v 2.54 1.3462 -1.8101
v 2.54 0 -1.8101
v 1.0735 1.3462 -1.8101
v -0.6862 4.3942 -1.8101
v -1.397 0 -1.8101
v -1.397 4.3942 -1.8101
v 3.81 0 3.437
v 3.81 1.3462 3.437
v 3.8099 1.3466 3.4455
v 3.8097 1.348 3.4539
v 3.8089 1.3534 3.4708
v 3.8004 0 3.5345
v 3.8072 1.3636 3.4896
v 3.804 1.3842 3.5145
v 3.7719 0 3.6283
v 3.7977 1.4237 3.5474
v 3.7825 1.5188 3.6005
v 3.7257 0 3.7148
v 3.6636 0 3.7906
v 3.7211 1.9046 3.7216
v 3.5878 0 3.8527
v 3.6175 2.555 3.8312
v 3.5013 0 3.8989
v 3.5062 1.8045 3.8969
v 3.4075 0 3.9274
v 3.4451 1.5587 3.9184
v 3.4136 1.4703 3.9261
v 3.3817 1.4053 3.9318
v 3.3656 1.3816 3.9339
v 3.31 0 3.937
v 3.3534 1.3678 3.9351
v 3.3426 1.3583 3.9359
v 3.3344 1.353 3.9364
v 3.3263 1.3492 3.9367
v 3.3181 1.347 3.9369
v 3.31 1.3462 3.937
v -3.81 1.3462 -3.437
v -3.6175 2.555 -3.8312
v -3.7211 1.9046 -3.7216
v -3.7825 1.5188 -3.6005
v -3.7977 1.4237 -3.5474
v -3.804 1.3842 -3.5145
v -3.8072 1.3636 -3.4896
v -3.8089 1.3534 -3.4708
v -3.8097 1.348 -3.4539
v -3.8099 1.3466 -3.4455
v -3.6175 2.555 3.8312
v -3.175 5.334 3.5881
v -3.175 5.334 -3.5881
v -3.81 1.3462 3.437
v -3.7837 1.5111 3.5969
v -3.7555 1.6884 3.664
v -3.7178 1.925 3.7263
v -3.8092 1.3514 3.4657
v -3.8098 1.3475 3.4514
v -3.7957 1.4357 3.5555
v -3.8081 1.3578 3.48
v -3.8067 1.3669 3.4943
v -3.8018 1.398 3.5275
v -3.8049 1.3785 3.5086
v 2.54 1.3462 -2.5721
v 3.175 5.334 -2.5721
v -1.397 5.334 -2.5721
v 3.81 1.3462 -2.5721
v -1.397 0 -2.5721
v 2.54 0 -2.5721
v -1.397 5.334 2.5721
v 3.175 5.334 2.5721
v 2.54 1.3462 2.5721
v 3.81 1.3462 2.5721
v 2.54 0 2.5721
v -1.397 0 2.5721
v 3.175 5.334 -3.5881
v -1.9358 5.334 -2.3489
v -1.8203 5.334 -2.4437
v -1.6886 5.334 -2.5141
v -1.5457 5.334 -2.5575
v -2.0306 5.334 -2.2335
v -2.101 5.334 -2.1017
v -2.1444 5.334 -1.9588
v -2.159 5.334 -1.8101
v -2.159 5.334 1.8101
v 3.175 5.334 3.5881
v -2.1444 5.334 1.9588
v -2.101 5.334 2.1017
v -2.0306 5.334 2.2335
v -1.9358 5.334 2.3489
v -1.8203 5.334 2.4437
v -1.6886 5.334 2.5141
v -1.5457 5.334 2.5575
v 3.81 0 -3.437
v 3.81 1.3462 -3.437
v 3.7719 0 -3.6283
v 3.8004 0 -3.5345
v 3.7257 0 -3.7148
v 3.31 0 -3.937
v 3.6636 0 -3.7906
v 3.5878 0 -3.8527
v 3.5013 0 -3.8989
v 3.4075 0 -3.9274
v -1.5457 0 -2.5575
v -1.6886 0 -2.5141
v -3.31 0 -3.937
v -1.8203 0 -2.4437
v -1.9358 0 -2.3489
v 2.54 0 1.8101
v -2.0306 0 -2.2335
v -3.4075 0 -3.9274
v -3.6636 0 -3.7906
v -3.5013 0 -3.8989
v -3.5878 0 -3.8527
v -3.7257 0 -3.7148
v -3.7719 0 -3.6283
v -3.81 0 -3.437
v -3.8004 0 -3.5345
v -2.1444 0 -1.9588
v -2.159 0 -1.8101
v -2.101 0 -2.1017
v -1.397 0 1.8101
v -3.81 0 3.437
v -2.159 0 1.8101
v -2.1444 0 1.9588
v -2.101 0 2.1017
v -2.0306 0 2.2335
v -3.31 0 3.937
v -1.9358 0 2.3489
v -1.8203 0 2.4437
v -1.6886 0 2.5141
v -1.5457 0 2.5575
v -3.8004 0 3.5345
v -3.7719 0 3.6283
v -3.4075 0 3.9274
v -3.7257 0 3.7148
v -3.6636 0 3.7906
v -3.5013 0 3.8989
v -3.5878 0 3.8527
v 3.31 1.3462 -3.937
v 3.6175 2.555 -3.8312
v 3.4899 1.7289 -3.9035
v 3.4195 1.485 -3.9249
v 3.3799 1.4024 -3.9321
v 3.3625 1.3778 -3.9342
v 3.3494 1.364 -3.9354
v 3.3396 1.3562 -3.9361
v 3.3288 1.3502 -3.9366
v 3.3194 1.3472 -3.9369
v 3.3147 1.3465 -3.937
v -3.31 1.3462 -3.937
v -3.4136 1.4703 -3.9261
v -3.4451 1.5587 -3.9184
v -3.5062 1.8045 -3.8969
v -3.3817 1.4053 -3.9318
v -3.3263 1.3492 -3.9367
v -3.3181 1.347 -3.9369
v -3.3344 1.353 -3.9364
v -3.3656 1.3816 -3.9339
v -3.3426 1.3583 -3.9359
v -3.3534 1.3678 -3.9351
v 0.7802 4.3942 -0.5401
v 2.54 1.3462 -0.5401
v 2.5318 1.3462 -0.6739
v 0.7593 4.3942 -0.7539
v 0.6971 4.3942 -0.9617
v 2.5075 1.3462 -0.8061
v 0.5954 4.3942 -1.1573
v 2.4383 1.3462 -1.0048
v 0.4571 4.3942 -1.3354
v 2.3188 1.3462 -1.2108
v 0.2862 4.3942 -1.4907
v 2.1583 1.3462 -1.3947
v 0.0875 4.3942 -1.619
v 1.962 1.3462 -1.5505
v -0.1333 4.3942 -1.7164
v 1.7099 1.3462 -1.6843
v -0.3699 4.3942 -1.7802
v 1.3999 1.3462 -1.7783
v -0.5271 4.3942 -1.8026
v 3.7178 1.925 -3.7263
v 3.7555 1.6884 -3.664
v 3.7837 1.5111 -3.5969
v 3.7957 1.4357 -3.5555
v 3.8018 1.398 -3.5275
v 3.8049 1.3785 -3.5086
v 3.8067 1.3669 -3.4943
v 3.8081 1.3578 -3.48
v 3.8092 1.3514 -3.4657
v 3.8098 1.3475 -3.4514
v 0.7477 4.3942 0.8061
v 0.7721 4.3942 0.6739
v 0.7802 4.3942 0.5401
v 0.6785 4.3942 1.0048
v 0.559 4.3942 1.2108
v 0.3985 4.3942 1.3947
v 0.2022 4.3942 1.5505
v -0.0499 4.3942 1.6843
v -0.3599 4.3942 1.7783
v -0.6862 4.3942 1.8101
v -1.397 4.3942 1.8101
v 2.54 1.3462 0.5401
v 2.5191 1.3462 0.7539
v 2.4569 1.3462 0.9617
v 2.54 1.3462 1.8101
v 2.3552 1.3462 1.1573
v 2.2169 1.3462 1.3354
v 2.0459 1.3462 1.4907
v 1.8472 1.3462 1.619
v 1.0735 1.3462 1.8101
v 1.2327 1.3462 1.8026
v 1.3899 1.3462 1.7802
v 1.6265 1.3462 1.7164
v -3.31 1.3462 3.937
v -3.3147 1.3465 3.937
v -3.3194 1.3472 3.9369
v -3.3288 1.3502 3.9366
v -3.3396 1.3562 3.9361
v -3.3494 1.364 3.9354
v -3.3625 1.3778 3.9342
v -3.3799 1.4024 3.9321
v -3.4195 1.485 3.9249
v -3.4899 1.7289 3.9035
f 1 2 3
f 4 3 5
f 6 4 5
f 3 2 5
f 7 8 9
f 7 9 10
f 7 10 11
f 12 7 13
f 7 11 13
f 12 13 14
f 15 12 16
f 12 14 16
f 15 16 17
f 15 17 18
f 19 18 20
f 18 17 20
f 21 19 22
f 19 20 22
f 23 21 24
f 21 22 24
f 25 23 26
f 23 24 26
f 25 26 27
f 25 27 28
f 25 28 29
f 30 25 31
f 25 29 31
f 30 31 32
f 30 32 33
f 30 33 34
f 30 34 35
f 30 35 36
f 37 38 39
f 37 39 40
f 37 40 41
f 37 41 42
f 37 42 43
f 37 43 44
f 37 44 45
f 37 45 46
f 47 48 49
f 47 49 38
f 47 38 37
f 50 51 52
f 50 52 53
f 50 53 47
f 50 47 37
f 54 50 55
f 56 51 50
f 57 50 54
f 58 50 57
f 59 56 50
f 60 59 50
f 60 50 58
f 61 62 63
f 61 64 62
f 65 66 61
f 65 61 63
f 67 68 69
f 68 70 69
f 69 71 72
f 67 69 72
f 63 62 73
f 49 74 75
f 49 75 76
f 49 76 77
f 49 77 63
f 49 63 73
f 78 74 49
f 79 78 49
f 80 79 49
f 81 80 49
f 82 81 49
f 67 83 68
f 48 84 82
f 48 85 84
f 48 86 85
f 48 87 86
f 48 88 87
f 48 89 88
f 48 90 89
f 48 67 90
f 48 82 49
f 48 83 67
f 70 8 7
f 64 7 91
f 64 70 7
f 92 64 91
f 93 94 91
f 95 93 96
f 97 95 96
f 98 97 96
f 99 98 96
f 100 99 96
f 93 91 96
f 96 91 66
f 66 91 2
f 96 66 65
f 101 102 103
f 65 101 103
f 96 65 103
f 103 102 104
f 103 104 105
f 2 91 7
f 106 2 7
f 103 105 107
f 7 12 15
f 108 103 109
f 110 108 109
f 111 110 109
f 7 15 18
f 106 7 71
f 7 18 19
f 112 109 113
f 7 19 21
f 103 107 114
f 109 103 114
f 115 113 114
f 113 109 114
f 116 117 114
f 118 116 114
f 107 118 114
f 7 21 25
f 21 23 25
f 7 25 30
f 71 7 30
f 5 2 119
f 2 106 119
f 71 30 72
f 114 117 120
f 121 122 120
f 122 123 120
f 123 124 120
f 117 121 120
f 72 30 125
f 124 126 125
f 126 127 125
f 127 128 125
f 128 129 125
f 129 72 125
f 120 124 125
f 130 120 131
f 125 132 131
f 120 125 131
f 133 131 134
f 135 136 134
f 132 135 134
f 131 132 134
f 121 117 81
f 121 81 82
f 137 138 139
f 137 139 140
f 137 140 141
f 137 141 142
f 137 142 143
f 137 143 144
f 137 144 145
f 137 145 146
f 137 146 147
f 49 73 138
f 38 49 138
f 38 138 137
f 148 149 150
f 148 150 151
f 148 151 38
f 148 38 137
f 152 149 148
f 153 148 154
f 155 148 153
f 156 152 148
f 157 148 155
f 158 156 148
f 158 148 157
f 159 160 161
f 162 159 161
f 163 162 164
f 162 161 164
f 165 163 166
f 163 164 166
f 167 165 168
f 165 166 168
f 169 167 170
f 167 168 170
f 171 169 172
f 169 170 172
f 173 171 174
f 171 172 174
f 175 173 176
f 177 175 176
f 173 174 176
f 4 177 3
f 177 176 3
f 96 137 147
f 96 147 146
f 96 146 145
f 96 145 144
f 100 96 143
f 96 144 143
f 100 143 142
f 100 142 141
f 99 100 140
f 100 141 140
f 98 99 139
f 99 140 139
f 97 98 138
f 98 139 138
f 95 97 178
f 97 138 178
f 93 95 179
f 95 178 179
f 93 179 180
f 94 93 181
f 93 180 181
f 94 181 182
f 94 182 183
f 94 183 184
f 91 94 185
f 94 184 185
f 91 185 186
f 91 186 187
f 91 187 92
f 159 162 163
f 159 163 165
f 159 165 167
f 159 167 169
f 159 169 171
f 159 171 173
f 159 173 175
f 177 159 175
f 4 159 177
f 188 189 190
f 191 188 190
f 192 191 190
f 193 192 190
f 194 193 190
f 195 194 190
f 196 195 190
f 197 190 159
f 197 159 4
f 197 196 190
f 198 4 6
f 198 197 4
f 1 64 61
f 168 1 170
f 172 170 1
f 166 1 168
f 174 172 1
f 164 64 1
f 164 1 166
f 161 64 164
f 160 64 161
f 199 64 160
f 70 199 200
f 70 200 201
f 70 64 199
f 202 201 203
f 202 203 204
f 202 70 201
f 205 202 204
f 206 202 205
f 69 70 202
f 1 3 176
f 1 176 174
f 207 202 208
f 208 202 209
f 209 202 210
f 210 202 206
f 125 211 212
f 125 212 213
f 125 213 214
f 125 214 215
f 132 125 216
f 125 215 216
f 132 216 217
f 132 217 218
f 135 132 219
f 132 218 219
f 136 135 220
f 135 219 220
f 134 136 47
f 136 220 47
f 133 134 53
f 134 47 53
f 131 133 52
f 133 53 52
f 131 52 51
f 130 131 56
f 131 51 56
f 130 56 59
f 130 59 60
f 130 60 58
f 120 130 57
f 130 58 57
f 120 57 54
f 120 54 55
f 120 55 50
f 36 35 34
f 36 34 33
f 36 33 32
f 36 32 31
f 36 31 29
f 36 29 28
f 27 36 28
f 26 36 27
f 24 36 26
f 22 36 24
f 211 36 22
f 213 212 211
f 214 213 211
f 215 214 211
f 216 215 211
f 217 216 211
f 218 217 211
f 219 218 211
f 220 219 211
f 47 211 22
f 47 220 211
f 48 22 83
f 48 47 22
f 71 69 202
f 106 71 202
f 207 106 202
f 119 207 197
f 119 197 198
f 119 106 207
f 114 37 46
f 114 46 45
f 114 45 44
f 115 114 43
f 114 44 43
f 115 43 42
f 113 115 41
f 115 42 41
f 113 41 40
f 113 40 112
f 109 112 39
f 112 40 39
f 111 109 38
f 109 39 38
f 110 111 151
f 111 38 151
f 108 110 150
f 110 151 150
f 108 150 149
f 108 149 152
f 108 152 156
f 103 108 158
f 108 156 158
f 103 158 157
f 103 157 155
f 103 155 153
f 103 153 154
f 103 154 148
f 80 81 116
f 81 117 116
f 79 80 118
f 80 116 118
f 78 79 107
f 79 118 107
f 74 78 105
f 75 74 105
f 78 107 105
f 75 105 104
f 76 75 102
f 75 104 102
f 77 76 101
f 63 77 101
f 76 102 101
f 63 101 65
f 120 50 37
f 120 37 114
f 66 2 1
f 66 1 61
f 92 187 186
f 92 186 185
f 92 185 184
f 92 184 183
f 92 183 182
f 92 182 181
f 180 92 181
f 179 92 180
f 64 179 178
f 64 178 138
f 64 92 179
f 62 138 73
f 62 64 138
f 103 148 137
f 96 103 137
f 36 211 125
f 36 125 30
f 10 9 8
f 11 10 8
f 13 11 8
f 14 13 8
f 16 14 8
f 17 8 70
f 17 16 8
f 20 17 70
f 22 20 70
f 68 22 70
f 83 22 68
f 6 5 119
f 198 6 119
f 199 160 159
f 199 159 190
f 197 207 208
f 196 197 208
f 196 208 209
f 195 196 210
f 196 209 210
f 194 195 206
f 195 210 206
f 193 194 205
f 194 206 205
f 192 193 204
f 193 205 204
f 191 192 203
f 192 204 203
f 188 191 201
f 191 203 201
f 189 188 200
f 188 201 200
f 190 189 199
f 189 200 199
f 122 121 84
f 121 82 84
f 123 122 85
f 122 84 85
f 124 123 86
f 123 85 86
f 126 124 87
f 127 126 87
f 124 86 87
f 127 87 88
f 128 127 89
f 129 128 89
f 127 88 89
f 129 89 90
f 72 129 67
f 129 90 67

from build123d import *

# Parameters (mm, degrees)
EXTRUDE1_DEPTH      = 3.937
DRAFT1_START        = -3.81
DRAFT1_DEPTH        = 7.62
SKETCH3_W           = 5.969
SKETCH3_H           = 5.144225416
CUT_EXTRUDE1_DEPTH  = 16.999459798
CUT_EXTRUDE2_DEPTH  = 16.999459798
SKETCH5_W           = 3.937
SKETCH5_H           = 3.620225416
EXTRUDE2_DEPTH      = 3.048
DRAFT2_ANGLE        = 30
FILLET1_R           = 1.27
FILLET2_R           = 0.762
SKETCH6_W           = 3.937
SKETCH6_H           = 3.620225416
EXTRUDE3_DEPTH      = 1.3462
CUT_EXTRUDE3_DEPTH  = 16.999459798
SKETCH12_W          = 4.3942
SKETCH12_H          = 1.3462
BOSS_EXTRUDE1_DEPTH = 70
CUT_EXTRUDE8_DEPTH  = 1.524
LPATTERN1_START     = -1.524
LPATTERN1_DEPTH     = 3.048
CUT_EXTRUDE9_DEPTH  = 86.170550743
FILLET3_R           = 1
CUT_EXTRUDE10_DEPTH = 85.172743295
FILLET4_R           = 0.5
CUT_EXTRUDE11_START = -1.3462
CUT_EXTRUDE11_DEPTH = 1.3462


# Read off the part's stored shape, not the designer's step: Draft1, LPattern1, Cut-Extrude11
with BuildPart() as part:
    # Sketch1 → Extrude1 (new, symmetric)
    with BuildSketch(Plane.XY):
        Polygon((3.81, 1.3462), (3.175, 5.334), (-3.175, 5.334), (-3.81, 1.3462), (-3.81, 0), (14.986, 0), (14.986, 1.3462), align=None)
    extrude(amount=EXTRUDE1_DEPTH, both=True)

    # Draft1 outline → Draft1 (cut)
    with BuildSketch(Plane.YZ.offset(DRAFT1_START)):
        Polygon((1.3462, 3.937), (5.334, 3.588112708), (5.334, 3.937), align=None)
        Polygon((5.334, -3.588112708), (1.3462, -3.937), (5.334, -3.937), align=None)
    extrude(amount=DRAFT1_DEPTH, mode=Mode.SUBTRACT)

    # Sketch3 → Cut-Extrude1 (cut, through all)
    with BuildSketch(Plane(origin=(0, 1.3462, 0), x_dir=(-1, 0, 0), z_dir=(0, 1, 0))):
        with Locations((-0.8255, 0)):
            Rectangle(SKETCH3_W, SKETCH3_H)
    extrude(amount=CUT_EXTRUDE1_DEPTH, mode=Mode.SUBTRACT)

    # Sketch4 → Cut-Extrude2 (cut, through all)
    with BuildSketch(Plane(origin=(0, 1.3462, 0), x_dir=(-1, 0, 0), z_dir=(0, 1, 0))):
        Polygon((2.159, 2.572112708), (-2.54, 2.572112708), (-2.54, 1.810112708), (1.397, 1.810112708), (1.397, -1.810112708), (-2.54, -1.810112708), (-2.54, -2.572112708), (2.159, -2.572112708), align=None)
    extrude(amount=-CUT_EXTRUDE2_DEPTH, mode=Mode.SUBTRACT)

    # Sketch5 → Extrude2 (add)
    with BuildSketch(Plane(origin=(0, 1.3462, 0), x_dir=(-1, 0, 0), z_dir=(0, 1, 0))):
        with Locations((-0.5715, 0)):
            Rectangle(SKETCH5_W, SKETCH5_H)
    extrude(amount=EXTRUDE2_DEPTH)

    # Draft2
    draft2_faces = [part.faces().sort_by_distance(p)[0] for p in [
        (2.54, 2.8702, 0),
    ]]
    draft(draft2_faces, Plane(origin=(14.986, 1.3462, 3.937), x_dir=(1, 0, 0), z_dir=(0, 1, 0)), DRAFT2_ANGLE)

    # Fillet1
    # the kernel refuses this fillet: 1.27 mm, written as the material it takes off along each edge
    with BuildSketch(Plane(origin=(4.1275, -1.403430657, 1.810112708), x_dir=(-0.866025403784438, -0.500000000000001, 0), z_dir=(-0.500000000000001, 0.866025403784438, 0))) as fillet1_piece_1_section:
        with BuildLine():
            CenterArc((FILLET1_R, -FILLET1_R), FILLET1_R, 90, 90)
            Line((0, -FILLET1_R), (0, 0))
            Line((0, 0), (FILLET1_R, 0))
        make_face()
    fillet1_piece_1 = extrude(amount=9.869527241, mode=Mode.PRIVATE)
    fillet1_piece_1 = split(fillet1_piece_1, bisect_by=Plane(origin=(2.54, 0.912532514, 1.637821639), z_dir=(-1, 0, 0)), keep=Keep.TOP, mode=Mode.PRIVATE)
    add(fillet1_piece_1, mode=Mode.SUBTRACT)
    with BuildSketch(Plane(origin=(4.1275, -1.403430657, -1.810112708), x_dir=(-0.8660254037844382, -0.500000000000001, 0), z_dir=(-0.500000000000001, 0.866025403784438, 0))) as fillet1_piece_2_section:
        with BuildLine():
            CenterArc((FILLET1_R, FILLET1_R), FILLET1_R, 180, 90)
            Line((0, FILLET1_R), (0, 0))
            Line((0, 0), (FILLET1_R, 0))
        make_face()
    fillet1_piece_2 = extrude(amount=9.869527241, mode=Mode.PRIVATE)
    fillet1_piece_2 = split(fillet1_piece_2, bisect_by=Plane(origin=(2.54, 0.912532514, -1.637821639), z_dir=(-1, 0, 0)), keep=Keep.TOP, mode=Mode.PRIVATE)
    add(fillet1_piece_2, mode=Mode.SUBTRACT)

    # Fillet2
    fillet2_edges = [part.edges().sort_by_distance(p)[0] for p in [
        (-2.159, 2.667, 2.572112708),
        (-2.159, 2.667, -2.572112708),
    ]]
    fillet(fillet2_edges, radius=FILLET2_R)

    # Sketch6 → Extrude3 (add)
    with BuildSketch(Plane.XZ):
        with Locations((0.5715, 0)):
            Rectangle(SKETCH6_W, SKETCH6_H)
    extrude(amount=-EXTRUDE3_DEPTH)

    # Sketch7 → Cut-Extrude3 (cut, through all)
    with BuildSketch(Plane(origin=(0, 1.3462, 0), x_dir=(-1, 0, 0), z_dir=(0, 1, 0))):
        Polygon((-14.986, 3.937), (-3.81, 3.937), (-10.668, 2.1971), (-14.986, 2.1971), align=None)
        Polygon((-14.986, -3.937), (-3.81, -3.937), (-10.668, -2.1971), (-14.986, -2.1971), align=None)
    extrude(amount=-CUT_EXTRUDE3_DEPTH, mode=Mode.SUBTRACT)

    # Sketch12 → Boss-Extrude1 (add)
    with BuildSketch(Plane(origin=(14.986, 0, 0), x_dir=(0, 0, -1), z_dir=(1, 0, 0))):
        with Locations((0, 0.6731)):
            Rectangle(SKETCH12_W, SKETCH12_H)
    extrude(amount=BOSS_EXTRUDE1_DEPTH)

    # Sketch11 → Cut-Extrude8 (cut, symmetric)
    with BuildSketch(Plane.XY):
        Polygon((10.668, 1.3462), (10.668, 1.0922), (11.684, 1.3462), (11.684, 1.637608524), (10.668, 1.637608524), align=None)
    extrude(amount=CUT_EXTRUDE8_DEPTH, both=True, mode=Mode.SUBTRACT)

    # LPattern1 outline → LPattern1 (cut)
    with BuildSketch(Plane.XY.offset(LPATTERN1_START)):
        Polygon((14.184, 1.3462), (13.168, 1.3462), (13.168, 1.0922), align=None)
        Polygon((79.184, 1.3462), (78.168, 1.3462), (78.168, 1.0922), align=None)
        Polygon((76.684, 1.3462), (75.668, 1.3462), (75.668, 1.0922), align=None)
        Polygon((74.184, 1.3462), (73.168, 1.3462), (73.168, 1.0922), align=None)
        Polygon((71.684, 1.3462), (70.668, 1.3462), (70.668, 1.0922), align=None)
        Polygon((69.184, 1.3462), (68.168, 1.3462), (68.168, 1.0922), align=None)
        Polygon((66.684, 1.3462), (65.668, 1.3462), (65.668, 1.0922), align=None)
        Polygon((64.184, 1.3462), (63.168, 1.3462), (63.168, 1.0922), align=None)
        Polygon((61.684, 1.3462), (60.668, 1.3462), (60.668, 1.0922), align=None)
        Polygon((59.184, 1.3462), (58.168, 1.3462), (58.168, 1.0922), align=None)
        Polygon((56.684, 1.3462), (55.668, 1.3462), (55.668, 1.0922), align=None)
        Polygon((54.184, 1.3462), (53.168, 1.3462), (53.168, 1.0922), align=None)
        Polygon((51.684, 1.3462), (50.668, 1.3462), (50.668, 1.0922), align=None)
        Polygon((49.184, 1.3462), (48.168, 1.3462), (48.168, 1.0922), align=None)
        Polygon((46.684, 1.3462), (45.668, 1.3462), (45.668, 1.0922), align=None)
        Polygon((44.184, 1.3462), (43.168, 1.3462), (43.168, 1.0922), align=None)
        Polygon((41.684, 1.3462), (40.668, 1.3462), (40.668, 1.0922), align=None)
        Polygon((39.184, 1.3462), (38.168, 1.3462), (38.168, 1.0922), align=None)
        Polygon((36.684, 1.3462), (35.668, 1.3462), (35.668, 1.0922), align=None)
        Polygon((34.184, 1.3462), (33.168, 1.3462), (33.168, 1.0922), align=None)
        Polygon((31.684, 1.3462), (30.668, 1.3462), (30.668, 1.0922), align=None)
        Polygon((29.184, 1.3462), (28.168, 1.3462), (28.168, 1.0922), align=None)
        Polygon((26.684, 1.3462), (25.668, 1.3462), (25.668, 1.0922), align=None)
        Polygon((24.184, 1.3462), (23.168, 1.3462), (23.168, 1.0922), align=None)
        Polygon((21.684, 1.3462), (20.668, 1.3462), (20.668, 1.0922), align=None)
        Polygon((19.184, 1.3462), (18.168, 1.3462), (18.168, 1.0922), align=None)
        Polygon((16.684, 1.3462), (15.668, 1.3462), (15.668, 1.0922), align=None)
    extrude(amount=LPATTERN1_DEPTH, mode=Mode.SUBTRACT)

    # Sketch13 → Cut-Extrude9 (cut, through all)
    with BuildSketch(Plane(origin=(0, 1.3462, 0), x_dir=(1, 0, 0), z_dir=(0, 1, 0))):
        Polygon((84.986, -2.1971), (84.986, 0), (81.180511171, -2.1971), align=None)
        Polygon((81.180511171, 2.1971), (84.986, 0), (84.986, 2.1971), align=None)
    extrude(amount=-CUT_EXTRUDE9_DEPTH, mode=Mode.SUBTRACT)

    # Fillet3
    fillet3_edges = [part.edges().sort_by_distance(p)[0] for p in [
        (84.986, 0.6731, 0),
    ]]
    fillet(fillet3_edges, radius=FILLET3_R)

    # Sketch14 → Cut-Extrude10 (cut, through all)
    with BuildSketch(Plane(origin=(0, 1.3462, 0), x_dir=(1, 0, 0), z_dir=(0, 1, 0))):
        Polygon((10.668, 2.1971), (3.81, 2.1971), (3.81, 3.937), align=None)
    cut_extrude10 = extrude(amount=-CUT_EXTRUDE10_DEPTH, mode=Mode.SUBTRACT)

    # Mirror1: Cut-Extrude10 across plane
    add(cut_extrude10.mirror(Plane.XY), mode=Mode.SUBTRACT)

    # Fillet4
    # the kernel refuses this fillet: 0.5 mm, written as the material it adds along each edge
    with BuildSketch(Plane(origin=(3.81, 1.3462, -2.1971), x_dir=(1, 0, 0), z_dir=(0, -1, 0)), Plane(origin=(3.81, 1.3462, 2.1971), x_dir=(0, 0, 1), z_dir=(0, -1, 0))) as fillet4_piece_1:
        with BuildLine():
            CenterArc((FILLET4_R, -FILLET4_R), FILLET4_R, 90, 90)
            Line((0, -FILLET4_R), (0, 0))
            Line((0, 0), (FILLET4_R, 0))
        make_face()
    extrude(amount=1.3462)
    # the kernel refuses this fillet: 0.5 mm, written as the material it takes off along each edge
    with BuildSketch(Plane(origin=(3.81, 2.5962, 3.937), x_dir=(0, 0, -1), z_dir=(0, -1, 0)), Plane(origin=(-3.81, 2.5962, 3.937), x_dir=(1, 0, 0), z_dir=(0, -1, 0)), Plane(origin=(3.81, 2.5962, -3.937), x_dir=(-1, 0, 0), z_dir=(0, -1, 0)), Plane(origin=(-3.81, 2.5962, -3.937), x_dir=(0, 0, 1), z_dir=(0, -1, 0))) as fillet4_2_piece_1:
        with BuildLine():
            CenterArc((FILLET4_R, -FILLET4_R), FILLET4_R, 90, 90)
            Line((0, -FILLET4_R), (0, 0))
            Line((0, 0), (FILLET4_R, 0))
        make_face()
    extrude(amount=3.8462, mode=Mode.SUBTRACT)

    # Cut-Extrude11 outline → Cut-Extrude11 (cut)
    with BuildSketch(Plane(origin=(0, 1.3462, 0), x_dir=(1, 0, 0), z_dir=(0, 1, 0)).offset(CUT_EXTRUDE11_START)):
        with BuildLine():
            ThreePointArc((4.31, 2.1971), (3.956446609, 2.343546609), (3.81, 2.6971))
            Line((3.81, 2.6971), (3.81, -2.6971))
            ThreePointArc((3.81, -2.6971), (3.956446609, -2.343546609), (4.31, -2.1971))
            Line((4.31, -2.1971), (81.180511171, -2.1971))
            Line((81.180511171, -2.1971), (83.486, -0.866025404))
            ThreePointArc((83.486, -0.866025404), (83.986, 0), (83.486, 0.866025404))
            Line((83.486, 0.866025404), (81.180511171, 2.1971))
            Line((81.180511171, 2.1971), (4.31, 2.1971))
        make_face()
    extrude(amount=CUT_EXTRUDE11_DEPTH, mode=Mode.SUBTRACT)


solid = part.part
